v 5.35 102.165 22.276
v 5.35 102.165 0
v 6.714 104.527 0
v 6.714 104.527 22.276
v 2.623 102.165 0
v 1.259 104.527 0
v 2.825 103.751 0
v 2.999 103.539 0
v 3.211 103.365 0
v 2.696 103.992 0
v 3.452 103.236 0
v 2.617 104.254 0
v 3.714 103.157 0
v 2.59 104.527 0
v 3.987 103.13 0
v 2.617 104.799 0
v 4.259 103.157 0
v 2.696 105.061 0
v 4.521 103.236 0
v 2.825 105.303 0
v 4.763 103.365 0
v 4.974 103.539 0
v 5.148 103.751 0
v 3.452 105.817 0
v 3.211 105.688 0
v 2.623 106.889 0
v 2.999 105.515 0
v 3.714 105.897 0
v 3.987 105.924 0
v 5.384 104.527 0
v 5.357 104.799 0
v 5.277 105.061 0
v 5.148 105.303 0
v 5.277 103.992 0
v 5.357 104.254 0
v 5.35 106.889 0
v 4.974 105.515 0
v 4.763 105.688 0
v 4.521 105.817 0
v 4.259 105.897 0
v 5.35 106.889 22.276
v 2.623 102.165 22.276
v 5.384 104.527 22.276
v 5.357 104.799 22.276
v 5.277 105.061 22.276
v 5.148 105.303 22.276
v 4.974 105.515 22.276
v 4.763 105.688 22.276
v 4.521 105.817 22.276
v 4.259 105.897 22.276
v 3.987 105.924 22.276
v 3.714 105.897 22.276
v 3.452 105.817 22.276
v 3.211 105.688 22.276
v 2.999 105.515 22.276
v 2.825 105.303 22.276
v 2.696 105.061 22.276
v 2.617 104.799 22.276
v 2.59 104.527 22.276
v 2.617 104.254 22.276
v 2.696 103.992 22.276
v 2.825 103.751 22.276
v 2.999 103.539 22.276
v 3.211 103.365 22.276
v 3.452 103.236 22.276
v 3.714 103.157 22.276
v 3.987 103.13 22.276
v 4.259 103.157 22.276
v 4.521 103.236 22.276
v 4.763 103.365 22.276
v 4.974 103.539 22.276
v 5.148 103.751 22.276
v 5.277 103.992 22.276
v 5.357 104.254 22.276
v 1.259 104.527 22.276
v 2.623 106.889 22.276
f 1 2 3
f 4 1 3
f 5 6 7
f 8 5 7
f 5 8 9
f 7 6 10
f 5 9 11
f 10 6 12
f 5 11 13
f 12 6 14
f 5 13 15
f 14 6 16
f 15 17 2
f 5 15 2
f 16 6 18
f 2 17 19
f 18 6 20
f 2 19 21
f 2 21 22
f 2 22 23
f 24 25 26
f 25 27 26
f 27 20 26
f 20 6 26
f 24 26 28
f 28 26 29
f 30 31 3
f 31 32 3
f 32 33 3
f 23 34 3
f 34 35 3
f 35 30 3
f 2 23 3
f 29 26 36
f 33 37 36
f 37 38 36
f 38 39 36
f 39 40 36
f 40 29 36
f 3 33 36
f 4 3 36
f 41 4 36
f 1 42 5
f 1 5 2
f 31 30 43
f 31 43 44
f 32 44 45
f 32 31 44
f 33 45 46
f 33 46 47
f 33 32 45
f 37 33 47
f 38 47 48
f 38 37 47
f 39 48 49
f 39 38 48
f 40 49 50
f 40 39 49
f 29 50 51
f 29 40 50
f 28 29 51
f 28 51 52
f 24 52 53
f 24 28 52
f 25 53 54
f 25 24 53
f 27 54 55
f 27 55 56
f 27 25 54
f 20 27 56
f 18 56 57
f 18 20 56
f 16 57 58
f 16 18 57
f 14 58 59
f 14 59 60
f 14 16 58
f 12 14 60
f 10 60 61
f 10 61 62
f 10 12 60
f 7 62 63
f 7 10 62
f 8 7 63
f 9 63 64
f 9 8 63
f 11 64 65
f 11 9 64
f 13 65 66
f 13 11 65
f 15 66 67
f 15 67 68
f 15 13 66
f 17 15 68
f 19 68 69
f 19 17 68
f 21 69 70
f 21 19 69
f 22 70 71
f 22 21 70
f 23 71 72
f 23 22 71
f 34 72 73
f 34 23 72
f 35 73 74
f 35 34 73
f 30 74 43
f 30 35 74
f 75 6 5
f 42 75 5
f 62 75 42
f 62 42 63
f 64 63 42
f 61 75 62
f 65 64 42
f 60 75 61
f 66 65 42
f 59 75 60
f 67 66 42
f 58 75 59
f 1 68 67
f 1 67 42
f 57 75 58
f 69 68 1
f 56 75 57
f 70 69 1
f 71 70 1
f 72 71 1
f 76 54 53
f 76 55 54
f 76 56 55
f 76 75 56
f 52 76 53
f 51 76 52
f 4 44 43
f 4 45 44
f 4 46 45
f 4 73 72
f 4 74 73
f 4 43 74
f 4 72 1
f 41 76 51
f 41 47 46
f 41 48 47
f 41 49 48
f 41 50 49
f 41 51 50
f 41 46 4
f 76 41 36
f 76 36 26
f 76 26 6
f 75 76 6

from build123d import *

# Parameters (mm, degrees)
SKETCH1_R           = 1.397
BOSS_EXTRUDE1_DEPTH = 22.2758


with BuildPart() as part:
    # Sketch1 → Boss-Extrude1 (new body)
    with BuildSketch(Plane.XY):
        Polygon((2.62285315, 106.888971188), (1.259036344, 104.526771188), (2.62285315, 102.164571188), (5.350486762, 102.164571188), (6.714303568, 104.526771188), (5.350486762, 106.888971188), align=None)
        with Locations((3.986669956, 104.526771188)):
            Circle(SKETCH1_R, mode=Mode.SUBTRACT)
    extrude(amount=BOSS_EXTRUDE1_DEPTH)


solid = part.part
